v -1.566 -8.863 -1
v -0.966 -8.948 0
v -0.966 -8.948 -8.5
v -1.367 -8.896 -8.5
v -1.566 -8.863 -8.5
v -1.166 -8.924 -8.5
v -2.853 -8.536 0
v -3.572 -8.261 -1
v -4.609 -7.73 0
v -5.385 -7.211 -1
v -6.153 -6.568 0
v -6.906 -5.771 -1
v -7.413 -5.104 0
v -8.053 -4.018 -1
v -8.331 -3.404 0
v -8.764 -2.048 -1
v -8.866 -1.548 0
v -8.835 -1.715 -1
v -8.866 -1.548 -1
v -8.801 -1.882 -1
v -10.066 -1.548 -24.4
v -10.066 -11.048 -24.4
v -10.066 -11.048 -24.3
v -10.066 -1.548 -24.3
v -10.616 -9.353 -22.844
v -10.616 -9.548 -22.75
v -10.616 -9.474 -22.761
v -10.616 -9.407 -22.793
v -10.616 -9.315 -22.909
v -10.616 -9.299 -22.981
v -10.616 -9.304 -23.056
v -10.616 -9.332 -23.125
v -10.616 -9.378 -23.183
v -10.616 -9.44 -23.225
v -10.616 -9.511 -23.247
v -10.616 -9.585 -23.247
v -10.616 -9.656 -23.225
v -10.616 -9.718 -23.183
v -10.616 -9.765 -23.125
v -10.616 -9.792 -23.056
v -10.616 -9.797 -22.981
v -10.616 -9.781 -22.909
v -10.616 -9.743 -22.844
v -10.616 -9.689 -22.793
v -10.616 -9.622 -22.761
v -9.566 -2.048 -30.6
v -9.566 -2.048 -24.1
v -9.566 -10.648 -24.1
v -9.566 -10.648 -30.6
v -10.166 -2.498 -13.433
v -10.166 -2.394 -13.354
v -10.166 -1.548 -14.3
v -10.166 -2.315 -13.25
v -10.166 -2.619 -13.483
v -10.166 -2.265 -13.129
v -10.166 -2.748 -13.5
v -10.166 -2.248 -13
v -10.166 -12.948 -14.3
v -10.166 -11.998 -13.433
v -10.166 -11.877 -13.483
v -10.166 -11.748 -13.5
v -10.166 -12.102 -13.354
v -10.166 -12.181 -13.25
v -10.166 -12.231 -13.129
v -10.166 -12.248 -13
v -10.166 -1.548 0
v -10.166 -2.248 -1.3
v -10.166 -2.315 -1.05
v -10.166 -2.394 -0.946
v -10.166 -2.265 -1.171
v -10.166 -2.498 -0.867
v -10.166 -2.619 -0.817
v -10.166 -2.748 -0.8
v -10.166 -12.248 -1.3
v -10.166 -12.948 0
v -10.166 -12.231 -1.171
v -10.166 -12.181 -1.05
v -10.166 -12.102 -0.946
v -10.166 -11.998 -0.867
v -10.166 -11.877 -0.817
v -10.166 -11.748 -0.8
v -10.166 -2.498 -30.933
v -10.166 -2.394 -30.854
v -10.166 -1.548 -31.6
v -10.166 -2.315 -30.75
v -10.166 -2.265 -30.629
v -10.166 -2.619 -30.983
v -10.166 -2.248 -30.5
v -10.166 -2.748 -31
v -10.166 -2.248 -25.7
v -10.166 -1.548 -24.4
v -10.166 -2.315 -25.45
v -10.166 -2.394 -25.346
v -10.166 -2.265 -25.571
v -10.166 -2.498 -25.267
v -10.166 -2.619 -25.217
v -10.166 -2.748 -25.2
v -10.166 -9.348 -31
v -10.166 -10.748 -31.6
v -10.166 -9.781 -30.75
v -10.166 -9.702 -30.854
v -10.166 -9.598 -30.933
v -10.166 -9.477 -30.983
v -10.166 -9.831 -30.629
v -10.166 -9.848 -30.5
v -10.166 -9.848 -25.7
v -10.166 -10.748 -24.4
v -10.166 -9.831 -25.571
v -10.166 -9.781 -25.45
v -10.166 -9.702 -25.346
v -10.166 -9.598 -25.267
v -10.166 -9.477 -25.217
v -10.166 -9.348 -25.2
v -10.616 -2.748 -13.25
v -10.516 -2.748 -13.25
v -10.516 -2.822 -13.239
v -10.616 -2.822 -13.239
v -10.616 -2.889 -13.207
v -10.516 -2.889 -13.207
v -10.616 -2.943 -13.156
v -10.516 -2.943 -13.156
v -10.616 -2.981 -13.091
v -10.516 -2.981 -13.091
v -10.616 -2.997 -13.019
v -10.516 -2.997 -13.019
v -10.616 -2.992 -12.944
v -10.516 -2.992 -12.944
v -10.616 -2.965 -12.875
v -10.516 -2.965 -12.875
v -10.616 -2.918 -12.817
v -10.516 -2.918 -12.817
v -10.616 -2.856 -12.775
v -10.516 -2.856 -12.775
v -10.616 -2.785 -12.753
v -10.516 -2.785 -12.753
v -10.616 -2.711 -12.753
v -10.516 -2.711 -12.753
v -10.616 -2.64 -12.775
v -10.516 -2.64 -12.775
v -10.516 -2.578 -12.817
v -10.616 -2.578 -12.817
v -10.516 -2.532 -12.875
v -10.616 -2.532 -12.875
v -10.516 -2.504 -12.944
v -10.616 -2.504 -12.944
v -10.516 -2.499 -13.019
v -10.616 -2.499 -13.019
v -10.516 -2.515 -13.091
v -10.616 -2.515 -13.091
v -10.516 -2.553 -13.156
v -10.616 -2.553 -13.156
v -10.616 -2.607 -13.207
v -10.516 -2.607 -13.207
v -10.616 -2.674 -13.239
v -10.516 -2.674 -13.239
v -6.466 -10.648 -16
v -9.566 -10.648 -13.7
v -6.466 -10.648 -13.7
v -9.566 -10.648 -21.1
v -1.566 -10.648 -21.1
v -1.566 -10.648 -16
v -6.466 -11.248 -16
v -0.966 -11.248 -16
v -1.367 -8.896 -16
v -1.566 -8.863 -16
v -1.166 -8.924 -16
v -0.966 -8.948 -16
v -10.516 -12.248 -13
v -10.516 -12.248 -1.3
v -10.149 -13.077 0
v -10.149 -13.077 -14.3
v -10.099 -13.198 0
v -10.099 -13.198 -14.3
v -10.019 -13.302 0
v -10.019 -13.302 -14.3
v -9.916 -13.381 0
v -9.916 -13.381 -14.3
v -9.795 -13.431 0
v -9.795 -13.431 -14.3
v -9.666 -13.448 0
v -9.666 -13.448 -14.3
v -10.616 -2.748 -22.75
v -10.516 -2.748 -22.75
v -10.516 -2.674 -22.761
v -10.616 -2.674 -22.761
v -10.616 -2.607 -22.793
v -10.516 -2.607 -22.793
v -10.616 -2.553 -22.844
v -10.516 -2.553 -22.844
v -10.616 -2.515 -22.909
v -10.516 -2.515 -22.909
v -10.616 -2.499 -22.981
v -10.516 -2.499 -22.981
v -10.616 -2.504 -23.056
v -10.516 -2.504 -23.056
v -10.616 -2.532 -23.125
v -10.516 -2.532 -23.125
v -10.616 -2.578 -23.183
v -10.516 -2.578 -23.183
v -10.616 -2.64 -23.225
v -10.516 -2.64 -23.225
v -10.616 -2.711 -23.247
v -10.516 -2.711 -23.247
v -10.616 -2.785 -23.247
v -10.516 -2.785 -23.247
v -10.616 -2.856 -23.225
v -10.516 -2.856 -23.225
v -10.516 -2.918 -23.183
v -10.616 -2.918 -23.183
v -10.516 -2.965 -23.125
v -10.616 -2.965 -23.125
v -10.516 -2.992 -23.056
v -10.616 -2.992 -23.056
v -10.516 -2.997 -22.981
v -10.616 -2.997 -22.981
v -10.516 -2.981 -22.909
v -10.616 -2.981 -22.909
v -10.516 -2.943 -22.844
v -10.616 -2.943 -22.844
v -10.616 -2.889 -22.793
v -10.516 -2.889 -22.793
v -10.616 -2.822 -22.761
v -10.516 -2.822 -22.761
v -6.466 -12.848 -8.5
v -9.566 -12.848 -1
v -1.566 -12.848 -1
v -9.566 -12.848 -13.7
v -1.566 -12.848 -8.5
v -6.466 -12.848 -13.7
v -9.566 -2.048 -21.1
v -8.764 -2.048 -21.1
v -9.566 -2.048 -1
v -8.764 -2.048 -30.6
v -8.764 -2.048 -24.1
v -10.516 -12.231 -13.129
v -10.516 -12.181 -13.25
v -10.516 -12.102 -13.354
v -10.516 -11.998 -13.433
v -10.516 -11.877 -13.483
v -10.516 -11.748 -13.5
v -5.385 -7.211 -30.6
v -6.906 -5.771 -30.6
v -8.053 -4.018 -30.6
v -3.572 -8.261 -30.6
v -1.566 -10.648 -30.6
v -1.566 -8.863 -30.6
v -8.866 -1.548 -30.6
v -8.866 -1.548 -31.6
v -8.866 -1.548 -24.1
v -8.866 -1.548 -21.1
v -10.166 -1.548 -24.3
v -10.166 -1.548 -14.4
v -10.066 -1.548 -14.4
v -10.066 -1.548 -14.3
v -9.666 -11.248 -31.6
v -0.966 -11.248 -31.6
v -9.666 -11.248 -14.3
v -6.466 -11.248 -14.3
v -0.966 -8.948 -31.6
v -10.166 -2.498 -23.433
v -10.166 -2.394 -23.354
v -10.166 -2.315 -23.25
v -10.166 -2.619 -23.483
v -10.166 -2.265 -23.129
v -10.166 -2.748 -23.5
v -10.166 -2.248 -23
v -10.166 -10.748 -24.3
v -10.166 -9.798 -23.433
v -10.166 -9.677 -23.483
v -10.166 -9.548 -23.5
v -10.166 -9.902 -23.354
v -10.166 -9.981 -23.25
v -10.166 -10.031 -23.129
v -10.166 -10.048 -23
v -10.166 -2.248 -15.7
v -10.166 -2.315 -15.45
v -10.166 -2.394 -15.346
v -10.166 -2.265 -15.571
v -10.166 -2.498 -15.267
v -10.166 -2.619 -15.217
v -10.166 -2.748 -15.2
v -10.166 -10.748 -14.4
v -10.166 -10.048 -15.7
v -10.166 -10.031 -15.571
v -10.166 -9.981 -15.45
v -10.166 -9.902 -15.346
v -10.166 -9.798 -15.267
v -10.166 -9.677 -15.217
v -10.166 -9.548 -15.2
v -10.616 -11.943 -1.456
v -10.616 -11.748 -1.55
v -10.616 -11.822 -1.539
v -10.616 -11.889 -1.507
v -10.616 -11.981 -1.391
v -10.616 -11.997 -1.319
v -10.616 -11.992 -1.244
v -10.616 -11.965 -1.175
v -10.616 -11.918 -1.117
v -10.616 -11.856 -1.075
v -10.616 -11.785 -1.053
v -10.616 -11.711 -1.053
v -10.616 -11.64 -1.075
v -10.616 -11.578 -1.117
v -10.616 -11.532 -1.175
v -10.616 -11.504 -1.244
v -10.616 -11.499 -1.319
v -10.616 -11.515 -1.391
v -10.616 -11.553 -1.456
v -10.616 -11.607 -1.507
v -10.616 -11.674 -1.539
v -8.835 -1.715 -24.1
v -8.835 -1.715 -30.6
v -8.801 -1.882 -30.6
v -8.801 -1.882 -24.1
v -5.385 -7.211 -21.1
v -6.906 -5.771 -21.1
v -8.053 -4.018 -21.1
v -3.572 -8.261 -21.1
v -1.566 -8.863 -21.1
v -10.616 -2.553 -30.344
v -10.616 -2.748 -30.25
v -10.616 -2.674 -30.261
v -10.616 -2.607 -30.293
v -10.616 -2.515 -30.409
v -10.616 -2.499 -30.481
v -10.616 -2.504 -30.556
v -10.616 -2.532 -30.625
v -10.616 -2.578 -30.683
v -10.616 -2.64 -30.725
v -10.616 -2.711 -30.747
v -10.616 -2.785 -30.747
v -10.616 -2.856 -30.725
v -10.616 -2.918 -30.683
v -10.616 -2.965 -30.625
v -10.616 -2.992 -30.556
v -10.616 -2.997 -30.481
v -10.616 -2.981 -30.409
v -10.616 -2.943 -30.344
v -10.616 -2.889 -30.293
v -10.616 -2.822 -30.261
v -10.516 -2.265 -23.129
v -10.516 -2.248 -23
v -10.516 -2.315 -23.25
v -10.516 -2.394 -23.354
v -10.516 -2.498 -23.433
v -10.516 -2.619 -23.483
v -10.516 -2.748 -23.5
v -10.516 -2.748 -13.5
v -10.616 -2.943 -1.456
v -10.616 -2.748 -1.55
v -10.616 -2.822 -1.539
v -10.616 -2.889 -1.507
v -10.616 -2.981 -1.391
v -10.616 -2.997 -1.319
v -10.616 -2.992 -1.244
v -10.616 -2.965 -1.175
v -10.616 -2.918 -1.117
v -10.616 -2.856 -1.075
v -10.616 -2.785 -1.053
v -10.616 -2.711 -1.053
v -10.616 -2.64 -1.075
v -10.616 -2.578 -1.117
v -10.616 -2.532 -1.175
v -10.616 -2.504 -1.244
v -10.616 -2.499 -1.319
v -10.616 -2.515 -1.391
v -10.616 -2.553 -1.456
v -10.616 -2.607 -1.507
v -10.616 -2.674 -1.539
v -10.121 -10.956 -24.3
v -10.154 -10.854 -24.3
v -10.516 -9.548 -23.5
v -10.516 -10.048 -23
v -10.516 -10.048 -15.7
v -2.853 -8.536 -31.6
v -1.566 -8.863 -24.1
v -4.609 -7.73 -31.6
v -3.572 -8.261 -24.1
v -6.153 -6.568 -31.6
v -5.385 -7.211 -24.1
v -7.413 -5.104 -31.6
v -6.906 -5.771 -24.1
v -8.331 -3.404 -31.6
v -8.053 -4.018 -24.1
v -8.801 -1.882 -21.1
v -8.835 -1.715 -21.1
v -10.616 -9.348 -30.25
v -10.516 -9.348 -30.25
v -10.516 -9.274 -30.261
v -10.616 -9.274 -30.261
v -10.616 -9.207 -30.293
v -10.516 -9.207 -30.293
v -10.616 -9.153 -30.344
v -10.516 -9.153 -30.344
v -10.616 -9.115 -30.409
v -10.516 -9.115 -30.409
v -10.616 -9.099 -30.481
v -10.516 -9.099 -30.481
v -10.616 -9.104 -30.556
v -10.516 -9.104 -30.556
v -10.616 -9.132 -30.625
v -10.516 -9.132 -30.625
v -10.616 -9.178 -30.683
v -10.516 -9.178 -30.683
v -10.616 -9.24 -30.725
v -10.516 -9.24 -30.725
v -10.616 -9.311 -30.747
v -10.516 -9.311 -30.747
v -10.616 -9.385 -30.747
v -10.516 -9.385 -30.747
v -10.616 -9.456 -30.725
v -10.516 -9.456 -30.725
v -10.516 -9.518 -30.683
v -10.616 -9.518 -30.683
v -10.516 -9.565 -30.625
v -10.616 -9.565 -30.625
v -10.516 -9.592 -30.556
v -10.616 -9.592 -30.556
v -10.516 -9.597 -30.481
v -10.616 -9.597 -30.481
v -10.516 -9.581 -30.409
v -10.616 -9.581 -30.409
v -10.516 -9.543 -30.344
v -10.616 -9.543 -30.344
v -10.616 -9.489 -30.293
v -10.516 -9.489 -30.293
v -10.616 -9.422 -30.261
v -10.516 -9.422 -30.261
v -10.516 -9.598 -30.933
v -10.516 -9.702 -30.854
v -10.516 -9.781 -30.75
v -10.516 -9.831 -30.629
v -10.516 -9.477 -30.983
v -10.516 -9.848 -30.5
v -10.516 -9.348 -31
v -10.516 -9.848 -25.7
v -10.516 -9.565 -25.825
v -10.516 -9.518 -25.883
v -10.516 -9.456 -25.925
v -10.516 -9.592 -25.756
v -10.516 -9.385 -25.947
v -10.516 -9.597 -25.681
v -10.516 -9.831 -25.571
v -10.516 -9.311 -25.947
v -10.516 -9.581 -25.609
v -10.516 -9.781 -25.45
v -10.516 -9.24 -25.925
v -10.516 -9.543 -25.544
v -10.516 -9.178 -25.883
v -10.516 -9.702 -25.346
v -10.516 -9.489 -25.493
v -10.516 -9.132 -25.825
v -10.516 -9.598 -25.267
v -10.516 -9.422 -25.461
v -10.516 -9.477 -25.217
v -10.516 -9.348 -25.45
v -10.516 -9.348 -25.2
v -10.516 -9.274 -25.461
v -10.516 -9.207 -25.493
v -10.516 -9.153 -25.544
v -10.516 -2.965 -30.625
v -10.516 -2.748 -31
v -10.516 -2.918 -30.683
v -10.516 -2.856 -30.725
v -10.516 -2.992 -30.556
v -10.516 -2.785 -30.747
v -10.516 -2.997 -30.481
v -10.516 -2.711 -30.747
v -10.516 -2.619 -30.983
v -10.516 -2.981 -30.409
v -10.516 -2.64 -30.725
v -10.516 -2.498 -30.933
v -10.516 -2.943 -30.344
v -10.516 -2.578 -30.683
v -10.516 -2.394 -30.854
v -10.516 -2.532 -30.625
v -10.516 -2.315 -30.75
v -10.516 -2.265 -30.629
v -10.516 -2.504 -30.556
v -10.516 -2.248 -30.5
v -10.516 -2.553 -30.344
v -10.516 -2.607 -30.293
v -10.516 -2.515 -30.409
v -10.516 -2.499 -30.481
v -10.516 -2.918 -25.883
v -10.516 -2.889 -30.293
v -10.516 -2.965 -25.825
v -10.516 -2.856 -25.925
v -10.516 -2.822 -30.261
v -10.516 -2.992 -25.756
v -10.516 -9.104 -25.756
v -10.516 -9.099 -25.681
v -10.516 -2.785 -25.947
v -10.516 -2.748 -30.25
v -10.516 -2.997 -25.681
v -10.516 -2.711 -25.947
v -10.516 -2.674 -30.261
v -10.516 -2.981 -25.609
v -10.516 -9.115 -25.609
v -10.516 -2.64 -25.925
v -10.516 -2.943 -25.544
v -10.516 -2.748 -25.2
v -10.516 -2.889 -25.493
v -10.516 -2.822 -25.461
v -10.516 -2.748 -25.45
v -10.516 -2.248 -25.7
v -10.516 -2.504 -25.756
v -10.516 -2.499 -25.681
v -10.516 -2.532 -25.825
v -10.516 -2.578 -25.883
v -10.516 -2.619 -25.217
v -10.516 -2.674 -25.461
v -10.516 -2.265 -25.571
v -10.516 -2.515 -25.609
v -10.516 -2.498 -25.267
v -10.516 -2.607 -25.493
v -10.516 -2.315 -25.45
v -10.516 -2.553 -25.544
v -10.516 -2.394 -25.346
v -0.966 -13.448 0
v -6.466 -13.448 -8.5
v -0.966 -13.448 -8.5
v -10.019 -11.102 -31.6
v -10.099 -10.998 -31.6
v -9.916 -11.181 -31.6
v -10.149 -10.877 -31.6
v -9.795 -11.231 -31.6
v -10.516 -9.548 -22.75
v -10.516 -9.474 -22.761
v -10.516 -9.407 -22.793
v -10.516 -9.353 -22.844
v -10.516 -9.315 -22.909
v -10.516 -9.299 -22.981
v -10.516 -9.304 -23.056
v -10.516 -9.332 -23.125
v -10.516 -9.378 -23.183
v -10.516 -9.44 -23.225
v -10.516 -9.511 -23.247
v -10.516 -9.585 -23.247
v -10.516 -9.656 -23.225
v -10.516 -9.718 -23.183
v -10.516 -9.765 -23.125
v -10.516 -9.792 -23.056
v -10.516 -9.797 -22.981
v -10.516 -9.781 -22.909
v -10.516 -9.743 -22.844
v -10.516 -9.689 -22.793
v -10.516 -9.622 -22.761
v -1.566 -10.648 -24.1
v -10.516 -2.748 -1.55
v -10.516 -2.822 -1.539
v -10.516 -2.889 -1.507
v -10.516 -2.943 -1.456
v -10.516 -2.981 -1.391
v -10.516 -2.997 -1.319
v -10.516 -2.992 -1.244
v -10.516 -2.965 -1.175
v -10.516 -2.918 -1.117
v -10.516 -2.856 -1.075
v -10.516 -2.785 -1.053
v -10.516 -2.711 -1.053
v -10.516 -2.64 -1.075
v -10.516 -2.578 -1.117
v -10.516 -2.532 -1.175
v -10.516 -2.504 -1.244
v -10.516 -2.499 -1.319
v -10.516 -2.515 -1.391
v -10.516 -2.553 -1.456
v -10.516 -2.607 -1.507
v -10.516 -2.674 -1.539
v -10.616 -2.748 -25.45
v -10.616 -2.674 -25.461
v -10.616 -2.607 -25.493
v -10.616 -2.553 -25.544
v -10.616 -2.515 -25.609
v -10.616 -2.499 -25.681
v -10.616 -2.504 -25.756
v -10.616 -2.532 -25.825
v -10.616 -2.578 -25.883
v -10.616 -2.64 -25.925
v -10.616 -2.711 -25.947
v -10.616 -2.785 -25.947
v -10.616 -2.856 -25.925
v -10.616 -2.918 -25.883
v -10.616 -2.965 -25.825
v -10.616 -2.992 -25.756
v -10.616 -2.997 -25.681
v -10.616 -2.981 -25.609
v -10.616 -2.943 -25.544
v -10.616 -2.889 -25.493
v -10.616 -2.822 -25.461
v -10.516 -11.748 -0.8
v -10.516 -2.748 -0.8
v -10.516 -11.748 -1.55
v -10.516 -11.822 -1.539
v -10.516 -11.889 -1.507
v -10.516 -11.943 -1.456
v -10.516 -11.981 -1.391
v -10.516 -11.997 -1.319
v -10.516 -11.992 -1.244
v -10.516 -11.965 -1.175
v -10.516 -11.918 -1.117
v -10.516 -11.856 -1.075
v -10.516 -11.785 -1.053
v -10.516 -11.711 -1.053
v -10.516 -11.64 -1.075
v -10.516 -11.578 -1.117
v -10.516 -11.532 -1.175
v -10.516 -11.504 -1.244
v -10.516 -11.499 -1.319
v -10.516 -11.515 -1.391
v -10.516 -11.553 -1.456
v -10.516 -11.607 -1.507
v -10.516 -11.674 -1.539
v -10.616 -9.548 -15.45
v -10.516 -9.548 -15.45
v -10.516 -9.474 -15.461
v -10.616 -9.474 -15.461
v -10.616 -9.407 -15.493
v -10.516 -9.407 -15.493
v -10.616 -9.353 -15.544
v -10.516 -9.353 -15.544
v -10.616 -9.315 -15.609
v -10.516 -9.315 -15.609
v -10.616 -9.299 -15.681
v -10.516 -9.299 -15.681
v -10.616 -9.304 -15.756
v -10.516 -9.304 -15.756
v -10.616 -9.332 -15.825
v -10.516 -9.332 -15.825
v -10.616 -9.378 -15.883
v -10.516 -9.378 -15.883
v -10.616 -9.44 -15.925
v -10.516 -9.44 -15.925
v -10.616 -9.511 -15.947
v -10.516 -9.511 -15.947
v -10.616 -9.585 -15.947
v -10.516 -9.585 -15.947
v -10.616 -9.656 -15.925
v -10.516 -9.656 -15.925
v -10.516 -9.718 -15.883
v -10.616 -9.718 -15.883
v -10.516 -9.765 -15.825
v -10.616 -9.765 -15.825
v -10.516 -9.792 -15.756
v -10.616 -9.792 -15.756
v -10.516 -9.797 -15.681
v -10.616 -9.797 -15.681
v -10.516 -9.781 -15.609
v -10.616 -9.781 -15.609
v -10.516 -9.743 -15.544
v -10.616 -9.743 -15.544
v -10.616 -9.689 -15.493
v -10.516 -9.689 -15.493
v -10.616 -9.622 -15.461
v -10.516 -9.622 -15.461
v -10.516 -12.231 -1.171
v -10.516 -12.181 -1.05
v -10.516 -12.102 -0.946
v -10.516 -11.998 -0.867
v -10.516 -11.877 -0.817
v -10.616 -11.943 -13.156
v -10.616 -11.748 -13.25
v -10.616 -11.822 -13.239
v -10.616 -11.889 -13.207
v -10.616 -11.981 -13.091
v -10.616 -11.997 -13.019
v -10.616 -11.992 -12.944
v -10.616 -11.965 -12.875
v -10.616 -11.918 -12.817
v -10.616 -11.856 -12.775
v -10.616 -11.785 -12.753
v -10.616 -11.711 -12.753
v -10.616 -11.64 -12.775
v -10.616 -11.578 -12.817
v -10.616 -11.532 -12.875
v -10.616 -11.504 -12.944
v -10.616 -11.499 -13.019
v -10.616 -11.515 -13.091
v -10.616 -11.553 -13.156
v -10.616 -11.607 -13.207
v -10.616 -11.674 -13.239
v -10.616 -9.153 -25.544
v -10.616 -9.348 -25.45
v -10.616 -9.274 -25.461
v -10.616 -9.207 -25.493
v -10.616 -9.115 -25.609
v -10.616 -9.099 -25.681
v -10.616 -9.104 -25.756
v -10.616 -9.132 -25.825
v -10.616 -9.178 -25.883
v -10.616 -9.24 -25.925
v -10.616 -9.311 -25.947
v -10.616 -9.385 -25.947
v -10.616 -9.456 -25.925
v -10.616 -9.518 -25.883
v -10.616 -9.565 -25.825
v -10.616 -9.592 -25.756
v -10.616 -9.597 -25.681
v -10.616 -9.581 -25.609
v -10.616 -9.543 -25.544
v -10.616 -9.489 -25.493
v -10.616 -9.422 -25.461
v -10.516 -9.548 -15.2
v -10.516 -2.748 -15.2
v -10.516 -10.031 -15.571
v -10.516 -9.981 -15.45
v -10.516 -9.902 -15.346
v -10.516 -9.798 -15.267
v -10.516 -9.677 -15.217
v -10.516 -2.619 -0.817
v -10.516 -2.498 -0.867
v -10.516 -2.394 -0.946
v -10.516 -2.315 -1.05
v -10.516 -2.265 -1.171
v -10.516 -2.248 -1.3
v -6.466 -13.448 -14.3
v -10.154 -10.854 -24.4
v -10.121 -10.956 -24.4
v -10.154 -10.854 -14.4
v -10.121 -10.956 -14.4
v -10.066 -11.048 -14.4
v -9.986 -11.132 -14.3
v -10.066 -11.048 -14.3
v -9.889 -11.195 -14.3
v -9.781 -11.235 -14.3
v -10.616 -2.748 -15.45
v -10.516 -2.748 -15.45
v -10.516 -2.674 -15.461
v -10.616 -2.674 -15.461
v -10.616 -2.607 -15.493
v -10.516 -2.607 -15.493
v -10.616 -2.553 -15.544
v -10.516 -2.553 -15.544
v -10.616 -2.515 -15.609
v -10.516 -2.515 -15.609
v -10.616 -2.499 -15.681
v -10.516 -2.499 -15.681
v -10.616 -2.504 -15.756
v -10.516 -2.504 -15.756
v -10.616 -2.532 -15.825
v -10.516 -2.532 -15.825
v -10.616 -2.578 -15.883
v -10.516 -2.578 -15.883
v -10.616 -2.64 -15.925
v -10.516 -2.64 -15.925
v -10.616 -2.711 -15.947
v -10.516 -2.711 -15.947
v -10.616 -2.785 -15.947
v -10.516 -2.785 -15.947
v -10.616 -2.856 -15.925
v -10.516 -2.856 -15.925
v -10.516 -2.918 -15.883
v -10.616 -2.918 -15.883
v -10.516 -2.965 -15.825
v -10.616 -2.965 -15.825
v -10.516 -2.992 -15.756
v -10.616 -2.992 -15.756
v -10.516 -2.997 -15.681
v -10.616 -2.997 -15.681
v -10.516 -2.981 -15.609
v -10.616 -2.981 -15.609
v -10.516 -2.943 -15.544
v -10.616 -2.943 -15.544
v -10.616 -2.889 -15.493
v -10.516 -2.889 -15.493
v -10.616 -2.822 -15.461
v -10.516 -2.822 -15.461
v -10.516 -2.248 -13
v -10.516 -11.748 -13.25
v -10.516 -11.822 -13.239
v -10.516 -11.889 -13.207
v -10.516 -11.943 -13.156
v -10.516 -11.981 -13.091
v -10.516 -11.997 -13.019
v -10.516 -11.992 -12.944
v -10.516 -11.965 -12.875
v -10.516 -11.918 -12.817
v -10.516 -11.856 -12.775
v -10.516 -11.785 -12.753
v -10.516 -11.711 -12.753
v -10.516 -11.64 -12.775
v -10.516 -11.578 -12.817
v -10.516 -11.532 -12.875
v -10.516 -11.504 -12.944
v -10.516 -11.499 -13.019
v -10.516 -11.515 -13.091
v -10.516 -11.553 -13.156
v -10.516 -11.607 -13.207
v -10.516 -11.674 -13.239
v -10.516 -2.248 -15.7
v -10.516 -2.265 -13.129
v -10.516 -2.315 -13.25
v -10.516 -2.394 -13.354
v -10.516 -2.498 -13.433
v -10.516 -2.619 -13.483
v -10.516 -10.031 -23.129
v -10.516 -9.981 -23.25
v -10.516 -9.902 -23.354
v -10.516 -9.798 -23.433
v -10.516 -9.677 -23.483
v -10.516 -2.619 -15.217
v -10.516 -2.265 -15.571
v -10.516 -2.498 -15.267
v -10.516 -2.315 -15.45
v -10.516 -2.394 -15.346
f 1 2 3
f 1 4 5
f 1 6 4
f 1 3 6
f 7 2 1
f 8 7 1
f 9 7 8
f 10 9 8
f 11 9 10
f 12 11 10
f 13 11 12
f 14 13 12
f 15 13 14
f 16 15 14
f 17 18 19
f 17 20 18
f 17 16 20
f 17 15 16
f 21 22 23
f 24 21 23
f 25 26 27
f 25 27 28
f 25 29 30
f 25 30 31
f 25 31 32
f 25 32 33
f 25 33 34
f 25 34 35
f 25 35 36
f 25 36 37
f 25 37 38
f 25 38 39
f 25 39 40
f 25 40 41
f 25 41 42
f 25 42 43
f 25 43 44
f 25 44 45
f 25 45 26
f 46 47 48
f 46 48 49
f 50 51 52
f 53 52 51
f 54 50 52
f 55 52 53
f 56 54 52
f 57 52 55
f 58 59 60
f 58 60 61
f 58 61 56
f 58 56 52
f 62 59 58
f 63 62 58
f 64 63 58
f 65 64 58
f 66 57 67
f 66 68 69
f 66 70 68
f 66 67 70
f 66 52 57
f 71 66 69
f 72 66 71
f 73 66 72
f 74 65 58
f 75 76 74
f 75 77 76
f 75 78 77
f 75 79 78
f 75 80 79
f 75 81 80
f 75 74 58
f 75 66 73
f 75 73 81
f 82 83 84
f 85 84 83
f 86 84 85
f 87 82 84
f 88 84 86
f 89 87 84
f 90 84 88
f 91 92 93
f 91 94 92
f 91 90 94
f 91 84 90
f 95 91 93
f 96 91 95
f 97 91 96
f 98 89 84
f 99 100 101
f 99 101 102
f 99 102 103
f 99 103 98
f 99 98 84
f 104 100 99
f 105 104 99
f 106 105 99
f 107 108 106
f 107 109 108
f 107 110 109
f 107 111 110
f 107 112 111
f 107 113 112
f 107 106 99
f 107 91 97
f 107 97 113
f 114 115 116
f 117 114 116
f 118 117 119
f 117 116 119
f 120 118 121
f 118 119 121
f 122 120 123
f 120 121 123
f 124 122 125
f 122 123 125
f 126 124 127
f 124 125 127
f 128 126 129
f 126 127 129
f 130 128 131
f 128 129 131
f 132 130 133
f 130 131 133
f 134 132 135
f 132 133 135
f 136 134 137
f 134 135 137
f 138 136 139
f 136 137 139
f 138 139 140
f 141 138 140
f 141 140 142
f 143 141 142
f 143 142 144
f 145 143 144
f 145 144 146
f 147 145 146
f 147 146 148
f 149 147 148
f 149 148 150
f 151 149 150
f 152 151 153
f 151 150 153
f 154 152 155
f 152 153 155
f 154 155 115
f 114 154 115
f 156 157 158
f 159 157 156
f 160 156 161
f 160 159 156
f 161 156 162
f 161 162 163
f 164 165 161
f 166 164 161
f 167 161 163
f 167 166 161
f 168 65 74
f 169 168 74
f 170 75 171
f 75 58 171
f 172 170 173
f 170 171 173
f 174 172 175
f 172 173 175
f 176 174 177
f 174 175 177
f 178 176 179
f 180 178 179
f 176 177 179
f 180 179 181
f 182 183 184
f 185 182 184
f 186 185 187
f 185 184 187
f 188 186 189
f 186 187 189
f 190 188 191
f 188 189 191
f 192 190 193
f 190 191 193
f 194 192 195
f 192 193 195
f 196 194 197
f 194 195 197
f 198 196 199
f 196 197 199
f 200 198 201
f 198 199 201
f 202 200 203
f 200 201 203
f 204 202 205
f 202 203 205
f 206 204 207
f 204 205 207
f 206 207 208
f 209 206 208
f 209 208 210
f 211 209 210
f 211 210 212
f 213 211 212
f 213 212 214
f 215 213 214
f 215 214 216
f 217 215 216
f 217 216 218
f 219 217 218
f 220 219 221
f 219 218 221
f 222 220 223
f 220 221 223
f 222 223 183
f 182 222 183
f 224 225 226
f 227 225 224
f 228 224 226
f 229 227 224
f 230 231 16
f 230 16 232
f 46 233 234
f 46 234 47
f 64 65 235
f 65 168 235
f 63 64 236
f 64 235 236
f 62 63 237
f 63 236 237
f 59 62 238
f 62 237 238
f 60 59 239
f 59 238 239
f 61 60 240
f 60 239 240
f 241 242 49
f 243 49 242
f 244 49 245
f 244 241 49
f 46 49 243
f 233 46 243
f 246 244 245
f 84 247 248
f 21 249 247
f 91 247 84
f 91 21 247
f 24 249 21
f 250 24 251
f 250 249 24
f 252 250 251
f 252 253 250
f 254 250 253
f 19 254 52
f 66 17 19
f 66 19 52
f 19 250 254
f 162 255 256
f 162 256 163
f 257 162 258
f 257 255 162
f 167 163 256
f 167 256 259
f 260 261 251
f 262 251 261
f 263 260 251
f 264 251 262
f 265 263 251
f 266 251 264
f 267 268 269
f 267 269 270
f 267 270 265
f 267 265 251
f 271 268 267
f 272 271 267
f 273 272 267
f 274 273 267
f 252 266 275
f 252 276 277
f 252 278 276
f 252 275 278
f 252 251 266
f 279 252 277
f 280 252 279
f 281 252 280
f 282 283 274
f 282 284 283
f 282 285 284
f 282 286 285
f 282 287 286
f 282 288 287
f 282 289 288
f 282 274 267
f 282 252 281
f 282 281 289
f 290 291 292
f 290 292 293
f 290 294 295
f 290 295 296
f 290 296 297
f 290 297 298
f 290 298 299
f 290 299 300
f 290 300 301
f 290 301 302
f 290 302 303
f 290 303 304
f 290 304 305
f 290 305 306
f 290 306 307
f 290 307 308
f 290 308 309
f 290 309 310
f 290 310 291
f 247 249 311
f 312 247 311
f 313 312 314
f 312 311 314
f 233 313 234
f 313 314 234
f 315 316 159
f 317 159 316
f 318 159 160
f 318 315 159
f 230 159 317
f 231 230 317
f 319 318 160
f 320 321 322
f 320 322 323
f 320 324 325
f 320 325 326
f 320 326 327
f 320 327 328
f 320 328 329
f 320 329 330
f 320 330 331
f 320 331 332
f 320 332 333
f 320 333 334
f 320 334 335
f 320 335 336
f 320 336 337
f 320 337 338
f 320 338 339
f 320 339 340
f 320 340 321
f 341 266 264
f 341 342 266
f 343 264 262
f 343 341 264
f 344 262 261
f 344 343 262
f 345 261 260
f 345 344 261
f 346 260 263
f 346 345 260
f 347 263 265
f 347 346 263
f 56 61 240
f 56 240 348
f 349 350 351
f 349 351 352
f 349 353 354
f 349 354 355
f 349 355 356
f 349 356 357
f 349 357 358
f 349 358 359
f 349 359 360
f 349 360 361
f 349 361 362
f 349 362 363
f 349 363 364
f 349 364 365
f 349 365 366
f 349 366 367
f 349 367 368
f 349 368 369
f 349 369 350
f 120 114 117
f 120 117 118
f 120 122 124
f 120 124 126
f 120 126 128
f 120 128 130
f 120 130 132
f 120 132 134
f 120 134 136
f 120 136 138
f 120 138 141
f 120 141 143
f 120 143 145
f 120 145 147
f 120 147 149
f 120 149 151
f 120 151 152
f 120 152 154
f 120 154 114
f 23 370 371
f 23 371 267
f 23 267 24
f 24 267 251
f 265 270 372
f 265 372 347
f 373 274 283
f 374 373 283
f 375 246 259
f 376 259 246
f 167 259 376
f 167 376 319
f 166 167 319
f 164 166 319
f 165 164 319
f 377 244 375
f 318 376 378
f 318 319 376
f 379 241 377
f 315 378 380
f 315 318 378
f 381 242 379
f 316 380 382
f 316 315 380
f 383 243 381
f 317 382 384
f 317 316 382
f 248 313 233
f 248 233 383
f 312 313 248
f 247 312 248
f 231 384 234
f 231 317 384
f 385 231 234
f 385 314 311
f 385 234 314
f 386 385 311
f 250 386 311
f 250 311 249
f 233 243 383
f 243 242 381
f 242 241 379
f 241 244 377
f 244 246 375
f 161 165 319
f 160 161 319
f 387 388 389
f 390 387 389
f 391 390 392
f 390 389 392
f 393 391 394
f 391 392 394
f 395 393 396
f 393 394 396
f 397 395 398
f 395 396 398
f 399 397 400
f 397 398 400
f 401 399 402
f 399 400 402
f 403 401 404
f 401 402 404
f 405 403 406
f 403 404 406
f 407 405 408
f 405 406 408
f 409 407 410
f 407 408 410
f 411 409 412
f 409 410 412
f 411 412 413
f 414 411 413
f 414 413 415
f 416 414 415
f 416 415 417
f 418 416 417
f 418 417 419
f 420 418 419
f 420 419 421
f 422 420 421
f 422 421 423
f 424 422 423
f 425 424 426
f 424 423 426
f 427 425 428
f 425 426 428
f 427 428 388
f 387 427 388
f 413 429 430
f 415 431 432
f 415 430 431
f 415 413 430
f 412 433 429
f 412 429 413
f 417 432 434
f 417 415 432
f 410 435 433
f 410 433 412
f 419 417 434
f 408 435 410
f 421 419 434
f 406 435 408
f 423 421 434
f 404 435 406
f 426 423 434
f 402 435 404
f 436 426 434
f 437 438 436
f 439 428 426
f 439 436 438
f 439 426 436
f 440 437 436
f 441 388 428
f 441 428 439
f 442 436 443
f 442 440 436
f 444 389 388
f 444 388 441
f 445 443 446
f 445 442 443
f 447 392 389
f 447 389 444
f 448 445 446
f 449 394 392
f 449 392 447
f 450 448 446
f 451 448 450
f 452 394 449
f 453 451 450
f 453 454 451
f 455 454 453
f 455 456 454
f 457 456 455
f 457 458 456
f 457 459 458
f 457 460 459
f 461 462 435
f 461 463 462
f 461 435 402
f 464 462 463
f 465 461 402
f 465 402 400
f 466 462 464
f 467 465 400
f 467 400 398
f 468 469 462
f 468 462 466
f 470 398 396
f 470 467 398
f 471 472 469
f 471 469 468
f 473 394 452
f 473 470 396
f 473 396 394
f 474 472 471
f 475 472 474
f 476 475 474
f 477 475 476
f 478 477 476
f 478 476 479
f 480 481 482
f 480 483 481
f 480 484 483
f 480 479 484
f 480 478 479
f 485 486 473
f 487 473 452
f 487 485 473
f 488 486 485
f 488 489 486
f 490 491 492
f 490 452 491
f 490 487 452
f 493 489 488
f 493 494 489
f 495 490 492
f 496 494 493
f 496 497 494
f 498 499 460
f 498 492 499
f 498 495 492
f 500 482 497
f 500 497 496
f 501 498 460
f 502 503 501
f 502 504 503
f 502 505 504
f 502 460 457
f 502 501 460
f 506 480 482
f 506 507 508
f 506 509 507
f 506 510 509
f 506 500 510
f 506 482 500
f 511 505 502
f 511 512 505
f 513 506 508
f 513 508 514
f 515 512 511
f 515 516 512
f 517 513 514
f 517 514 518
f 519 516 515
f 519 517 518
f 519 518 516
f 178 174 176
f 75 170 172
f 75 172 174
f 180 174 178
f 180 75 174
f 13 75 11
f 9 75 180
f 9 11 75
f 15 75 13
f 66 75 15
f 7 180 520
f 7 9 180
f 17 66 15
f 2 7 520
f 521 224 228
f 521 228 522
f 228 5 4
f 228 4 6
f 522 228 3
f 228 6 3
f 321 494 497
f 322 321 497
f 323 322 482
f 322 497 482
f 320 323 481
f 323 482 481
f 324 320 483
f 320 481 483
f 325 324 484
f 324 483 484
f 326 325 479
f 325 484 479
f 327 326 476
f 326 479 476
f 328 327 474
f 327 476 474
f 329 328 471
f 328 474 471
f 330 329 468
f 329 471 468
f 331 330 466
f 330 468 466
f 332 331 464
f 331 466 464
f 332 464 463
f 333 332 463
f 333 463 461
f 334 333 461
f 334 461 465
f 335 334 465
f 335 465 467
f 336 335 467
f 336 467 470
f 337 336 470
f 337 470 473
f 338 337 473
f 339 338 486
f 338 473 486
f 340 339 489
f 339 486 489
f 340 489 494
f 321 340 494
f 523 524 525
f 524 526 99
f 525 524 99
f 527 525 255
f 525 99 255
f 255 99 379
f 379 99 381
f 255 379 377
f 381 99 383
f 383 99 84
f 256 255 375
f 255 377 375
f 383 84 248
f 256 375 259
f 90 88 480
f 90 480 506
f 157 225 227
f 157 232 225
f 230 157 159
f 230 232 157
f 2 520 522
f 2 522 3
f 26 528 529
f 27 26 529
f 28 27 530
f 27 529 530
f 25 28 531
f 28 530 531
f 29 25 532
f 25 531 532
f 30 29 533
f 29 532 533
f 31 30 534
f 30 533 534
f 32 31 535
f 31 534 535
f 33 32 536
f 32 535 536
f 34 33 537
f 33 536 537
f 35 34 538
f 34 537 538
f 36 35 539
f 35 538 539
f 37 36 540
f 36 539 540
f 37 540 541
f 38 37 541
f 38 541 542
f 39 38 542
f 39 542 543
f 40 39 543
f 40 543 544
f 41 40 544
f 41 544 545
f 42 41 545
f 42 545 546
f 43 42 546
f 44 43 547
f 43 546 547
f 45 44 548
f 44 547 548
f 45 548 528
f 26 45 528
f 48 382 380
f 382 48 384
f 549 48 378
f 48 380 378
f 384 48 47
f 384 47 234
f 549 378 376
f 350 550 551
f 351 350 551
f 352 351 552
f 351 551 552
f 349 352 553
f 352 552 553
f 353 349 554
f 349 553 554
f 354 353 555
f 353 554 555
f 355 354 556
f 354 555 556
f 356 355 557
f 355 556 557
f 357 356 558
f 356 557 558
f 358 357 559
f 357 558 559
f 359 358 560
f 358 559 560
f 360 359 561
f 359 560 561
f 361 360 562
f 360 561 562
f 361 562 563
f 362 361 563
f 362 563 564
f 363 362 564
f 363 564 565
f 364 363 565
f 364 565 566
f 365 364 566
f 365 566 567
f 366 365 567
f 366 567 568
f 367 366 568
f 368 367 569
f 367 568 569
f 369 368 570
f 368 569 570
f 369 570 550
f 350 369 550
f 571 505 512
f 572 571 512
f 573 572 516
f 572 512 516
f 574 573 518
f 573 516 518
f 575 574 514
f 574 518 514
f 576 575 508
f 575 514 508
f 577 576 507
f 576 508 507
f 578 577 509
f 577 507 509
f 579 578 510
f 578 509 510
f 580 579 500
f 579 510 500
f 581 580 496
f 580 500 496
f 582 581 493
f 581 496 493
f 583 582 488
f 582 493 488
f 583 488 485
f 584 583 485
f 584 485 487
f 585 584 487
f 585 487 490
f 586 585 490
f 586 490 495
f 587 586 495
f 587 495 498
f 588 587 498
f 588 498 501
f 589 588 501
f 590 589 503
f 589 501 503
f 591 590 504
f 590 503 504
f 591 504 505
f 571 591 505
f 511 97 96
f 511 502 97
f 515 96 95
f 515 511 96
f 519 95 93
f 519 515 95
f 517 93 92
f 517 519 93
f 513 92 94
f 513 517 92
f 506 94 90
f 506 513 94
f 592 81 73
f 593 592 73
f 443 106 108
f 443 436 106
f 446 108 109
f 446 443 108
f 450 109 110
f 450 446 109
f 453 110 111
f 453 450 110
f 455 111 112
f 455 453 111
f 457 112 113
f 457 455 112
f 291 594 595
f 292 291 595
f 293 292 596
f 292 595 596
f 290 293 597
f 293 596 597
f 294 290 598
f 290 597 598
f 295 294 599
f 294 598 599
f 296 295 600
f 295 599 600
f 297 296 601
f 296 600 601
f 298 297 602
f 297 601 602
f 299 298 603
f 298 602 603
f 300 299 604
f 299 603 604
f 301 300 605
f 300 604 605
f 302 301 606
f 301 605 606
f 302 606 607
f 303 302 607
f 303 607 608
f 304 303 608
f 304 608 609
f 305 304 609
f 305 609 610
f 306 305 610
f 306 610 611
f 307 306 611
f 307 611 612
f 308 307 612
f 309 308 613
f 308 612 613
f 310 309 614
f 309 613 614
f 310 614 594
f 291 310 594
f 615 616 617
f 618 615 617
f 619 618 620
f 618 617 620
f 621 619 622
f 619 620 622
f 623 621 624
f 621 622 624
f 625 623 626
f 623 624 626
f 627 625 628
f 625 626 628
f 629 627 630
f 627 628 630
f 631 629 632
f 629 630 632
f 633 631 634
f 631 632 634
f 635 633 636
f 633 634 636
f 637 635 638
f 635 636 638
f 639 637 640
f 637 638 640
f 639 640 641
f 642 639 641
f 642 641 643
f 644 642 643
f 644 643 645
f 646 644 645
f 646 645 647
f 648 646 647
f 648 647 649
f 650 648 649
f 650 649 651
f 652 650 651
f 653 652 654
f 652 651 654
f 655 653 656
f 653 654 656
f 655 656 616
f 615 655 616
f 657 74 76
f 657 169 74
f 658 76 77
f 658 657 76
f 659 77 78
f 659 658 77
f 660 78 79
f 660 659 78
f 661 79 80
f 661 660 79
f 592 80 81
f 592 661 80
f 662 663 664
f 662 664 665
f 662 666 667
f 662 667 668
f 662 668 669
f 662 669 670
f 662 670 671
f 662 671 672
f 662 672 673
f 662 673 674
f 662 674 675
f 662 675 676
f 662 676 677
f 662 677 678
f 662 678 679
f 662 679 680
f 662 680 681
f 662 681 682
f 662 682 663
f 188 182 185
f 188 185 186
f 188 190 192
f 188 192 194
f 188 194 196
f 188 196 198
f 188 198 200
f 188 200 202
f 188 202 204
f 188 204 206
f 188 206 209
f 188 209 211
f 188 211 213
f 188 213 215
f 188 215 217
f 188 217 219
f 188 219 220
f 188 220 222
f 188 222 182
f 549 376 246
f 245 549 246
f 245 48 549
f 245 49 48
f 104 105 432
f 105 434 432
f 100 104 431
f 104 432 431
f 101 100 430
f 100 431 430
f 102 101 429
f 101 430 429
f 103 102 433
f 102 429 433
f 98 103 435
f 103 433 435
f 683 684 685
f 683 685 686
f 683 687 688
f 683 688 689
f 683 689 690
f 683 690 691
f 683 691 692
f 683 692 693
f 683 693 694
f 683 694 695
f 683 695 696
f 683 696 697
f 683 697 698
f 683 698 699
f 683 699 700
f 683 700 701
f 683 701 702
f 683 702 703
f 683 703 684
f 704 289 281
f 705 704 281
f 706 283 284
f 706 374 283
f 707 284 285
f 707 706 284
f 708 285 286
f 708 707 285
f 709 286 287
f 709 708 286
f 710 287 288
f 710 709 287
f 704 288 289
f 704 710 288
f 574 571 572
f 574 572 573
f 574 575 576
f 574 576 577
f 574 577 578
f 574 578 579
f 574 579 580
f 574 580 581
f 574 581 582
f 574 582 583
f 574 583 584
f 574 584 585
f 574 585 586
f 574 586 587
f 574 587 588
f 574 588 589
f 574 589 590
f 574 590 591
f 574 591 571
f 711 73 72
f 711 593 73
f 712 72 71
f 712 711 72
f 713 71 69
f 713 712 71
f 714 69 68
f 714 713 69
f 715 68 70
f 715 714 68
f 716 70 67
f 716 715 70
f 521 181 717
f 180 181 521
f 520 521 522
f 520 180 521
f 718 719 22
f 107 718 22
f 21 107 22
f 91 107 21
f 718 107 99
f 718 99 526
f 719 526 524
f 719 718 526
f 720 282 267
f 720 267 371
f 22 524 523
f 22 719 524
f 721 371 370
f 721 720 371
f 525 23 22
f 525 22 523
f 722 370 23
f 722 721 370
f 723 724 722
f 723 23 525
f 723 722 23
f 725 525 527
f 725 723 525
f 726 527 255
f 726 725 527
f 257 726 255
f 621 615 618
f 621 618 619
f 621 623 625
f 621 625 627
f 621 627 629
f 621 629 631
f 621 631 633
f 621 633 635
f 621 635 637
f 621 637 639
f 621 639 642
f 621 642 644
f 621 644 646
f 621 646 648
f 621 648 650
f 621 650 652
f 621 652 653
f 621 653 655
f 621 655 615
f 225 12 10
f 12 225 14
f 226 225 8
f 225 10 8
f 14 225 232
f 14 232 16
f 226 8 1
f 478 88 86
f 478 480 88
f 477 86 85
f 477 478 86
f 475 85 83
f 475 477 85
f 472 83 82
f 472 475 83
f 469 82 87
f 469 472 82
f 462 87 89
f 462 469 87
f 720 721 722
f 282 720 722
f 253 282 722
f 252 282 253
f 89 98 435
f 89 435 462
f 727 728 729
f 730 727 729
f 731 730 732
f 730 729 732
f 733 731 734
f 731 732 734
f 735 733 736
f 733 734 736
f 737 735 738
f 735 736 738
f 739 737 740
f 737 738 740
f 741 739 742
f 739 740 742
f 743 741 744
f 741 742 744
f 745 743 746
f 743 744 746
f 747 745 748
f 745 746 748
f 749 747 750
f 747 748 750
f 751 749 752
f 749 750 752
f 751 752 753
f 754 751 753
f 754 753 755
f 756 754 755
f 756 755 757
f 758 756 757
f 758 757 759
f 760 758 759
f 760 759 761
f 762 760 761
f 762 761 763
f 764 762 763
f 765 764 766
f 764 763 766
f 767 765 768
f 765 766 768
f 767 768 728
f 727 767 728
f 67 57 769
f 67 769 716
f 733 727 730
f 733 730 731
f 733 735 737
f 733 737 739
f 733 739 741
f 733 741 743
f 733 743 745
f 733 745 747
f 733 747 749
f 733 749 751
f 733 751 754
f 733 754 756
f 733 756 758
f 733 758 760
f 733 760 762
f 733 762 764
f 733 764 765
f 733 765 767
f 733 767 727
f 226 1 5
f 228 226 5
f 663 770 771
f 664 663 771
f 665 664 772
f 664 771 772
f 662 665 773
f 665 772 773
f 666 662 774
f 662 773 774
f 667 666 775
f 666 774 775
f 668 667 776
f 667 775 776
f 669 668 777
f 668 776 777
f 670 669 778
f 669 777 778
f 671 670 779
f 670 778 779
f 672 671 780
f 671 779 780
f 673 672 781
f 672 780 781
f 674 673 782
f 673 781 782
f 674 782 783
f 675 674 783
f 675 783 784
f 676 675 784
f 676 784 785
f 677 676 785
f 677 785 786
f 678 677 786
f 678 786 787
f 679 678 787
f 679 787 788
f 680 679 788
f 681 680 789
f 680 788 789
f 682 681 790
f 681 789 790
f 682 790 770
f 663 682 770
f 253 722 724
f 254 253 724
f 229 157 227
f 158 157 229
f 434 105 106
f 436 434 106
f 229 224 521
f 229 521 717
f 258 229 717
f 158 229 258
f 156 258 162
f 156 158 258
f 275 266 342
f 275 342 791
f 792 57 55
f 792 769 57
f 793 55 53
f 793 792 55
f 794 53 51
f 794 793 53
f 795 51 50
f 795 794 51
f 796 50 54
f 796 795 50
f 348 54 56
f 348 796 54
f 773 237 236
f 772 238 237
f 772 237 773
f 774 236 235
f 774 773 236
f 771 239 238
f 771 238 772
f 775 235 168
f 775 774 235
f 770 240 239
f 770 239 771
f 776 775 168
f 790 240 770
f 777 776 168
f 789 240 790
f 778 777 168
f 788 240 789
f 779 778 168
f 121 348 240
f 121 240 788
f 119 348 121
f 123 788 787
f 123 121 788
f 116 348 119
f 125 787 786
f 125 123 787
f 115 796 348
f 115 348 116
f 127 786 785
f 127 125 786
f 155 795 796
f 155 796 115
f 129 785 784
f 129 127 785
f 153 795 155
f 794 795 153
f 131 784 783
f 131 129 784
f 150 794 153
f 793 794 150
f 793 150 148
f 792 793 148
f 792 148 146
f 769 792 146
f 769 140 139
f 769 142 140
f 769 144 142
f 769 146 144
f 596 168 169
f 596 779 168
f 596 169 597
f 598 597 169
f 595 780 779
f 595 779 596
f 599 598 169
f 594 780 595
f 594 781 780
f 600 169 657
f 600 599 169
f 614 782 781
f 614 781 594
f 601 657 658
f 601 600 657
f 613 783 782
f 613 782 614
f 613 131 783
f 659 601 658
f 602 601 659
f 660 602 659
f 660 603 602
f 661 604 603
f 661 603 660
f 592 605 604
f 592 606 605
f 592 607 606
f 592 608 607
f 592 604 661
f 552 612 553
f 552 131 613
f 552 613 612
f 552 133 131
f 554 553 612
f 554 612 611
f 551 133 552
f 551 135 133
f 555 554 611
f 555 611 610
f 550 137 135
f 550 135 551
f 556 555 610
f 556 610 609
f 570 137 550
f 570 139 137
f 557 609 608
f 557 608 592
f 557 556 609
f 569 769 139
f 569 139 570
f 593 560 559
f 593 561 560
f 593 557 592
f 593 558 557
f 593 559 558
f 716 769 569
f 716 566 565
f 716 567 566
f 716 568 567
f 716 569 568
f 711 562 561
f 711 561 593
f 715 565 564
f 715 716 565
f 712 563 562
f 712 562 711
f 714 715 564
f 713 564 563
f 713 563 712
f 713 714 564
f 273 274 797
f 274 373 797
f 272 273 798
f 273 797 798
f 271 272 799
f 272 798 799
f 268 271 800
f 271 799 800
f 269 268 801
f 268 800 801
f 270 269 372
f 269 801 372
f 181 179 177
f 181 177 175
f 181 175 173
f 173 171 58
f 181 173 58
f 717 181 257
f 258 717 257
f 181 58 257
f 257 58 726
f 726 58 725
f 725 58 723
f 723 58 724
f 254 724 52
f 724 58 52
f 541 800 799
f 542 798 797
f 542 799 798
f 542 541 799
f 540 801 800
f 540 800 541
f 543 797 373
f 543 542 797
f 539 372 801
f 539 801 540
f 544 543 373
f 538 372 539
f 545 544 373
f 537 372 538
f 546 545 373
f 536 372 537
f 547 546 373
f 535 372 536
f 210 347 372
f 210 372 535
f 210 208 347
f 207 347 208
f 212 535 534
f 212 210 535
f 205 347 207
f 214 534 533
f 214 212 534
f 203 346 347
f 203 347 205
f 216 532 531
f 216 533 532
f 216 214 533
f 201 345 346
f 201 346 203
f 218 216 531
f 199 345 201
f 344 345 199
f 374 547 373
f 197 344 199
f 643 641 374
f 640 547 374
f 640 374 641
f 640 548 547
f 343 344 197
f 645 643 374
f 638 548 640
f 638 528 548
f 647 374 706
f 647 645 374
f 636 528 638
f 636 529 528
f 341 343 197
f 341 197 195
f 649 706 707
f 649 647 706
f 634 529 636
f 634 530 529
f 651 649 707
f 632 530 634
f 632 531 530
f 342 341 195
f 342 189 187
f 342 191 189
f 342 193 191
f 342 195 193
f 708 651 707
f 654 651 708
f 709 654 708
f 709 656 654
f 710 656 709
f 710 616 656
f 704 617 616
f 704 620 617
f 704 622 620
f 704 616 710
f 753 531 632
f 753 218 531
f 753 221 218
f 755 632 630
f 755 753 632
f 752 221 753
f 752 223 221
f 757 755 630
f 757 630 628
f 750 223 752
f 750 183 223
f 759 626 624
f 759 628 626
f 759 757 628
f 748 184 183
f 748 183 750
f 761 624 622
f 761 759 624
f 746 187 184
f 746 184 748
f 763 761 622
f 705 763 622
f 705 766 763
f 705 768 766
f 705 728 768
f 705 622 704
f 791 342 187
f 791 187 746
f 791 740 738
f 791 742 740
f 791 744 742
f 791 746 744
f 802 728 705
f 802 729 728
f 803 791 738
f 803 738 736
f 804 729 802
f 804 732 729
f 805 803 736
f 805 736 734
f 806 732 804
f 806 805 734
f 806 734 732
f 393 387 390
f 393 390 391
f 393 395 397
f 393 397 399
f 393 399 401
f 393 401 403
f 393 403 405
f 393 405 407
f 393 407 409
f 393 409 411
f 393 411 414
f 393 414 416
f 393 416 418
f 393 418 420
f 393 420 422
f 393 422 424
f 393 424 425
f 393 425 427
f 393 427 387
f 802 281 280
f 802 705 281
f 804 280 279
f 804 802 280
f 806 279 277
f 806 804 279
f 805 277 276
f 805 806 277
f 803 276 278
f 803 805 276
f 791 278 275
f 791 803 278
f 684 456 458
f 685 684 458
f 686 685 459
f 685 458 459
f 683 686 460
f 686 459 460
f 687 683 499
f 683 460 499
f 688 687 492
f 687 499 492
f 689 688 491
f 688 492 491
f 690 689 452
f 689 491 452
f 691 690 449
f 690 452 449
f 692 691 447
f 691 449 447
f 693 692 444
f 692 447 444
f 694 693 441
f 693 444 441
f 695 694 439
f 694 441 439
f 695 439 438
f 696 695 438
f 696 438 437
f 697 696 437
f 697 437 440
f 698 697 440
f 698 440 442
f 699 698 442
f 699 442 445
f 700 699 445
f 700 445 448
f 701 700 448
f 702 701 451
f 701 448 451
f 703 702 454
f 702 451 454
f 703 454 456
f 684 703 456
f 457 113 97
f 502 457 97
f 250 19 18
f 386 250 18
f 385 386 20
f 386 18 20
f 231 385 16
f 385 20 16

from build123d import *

# Parameters (mm, degrees)
BOSS_EXTRUDE1_DEPTH = 31.6
SKETCH4_W           = 12.7
SKETCH4_H           = 10
SKETCH4_W_2         = 8.3
SKETCH4_H_2         = 7.8
SKETCH4_W_3         = 5.8
SKETCH4_H_3         = 7.6
BOSS_EXTRUDE2_DEPTH = 0.35
FILLET1_R           = 0.5
SKETCH5_R           = 0.25
BOSS_EXTRUDE3_DEPTH = 0.1
SKETCH19_W          = 17.3
SKETCH19_H          = 2.2
CUT_EXTRUDE11_DEPTH = 36.553470936
FILLET2_R           = 0.5
SKETCH21_W          = 0.1
SKETCH21_H          = 9.7
CUT_EXTRUDE13_DEPTH = 0.1
SKETCH20_W          = 5.5
SKETCH20_H          = 7.5
CUT_EXTRUDE12_DEPTH = 36.945875479
SKETCH22_W          = 7.3
SKETCH22_H          = 12.7
CUT_EXTRUDE14_DEPTH = 11.3
SKETCH22_3_W        = 7.3
SKETCH22_3_H        = 7.4
SKETCH22_3_H_2      = 6.5
CUT_EXTRUDE15_DEPTH = 9.1
SKETCH23_W          = 6.5
SKETCH23_H          = 8.6
CUT_EXTRUDE16_DEPTH = 0.7
BOSS_EXTRUDE4_REACH = 37.07


with BuildPart() as part:
    # Sketch2 → Boss-Extrude1 (new body)
    with BuildSketch(Plane.XY):
        with BuildLine():
            Line((-0.965868705, -13.448021996), (-0.965868705, -8.948021996))
            ThreePointArc((-0.965868705, -8.948021996), (-6.152703888, -6.568427123), (-8.865868705, -1.548021996))
            Line((-8.865868705, -1.548021996), (-10.165868705, -1.548021996))
            Line((-10.165868705, -1.548021996), (-10.165868705, -13.448021996))
            Line((-10.165868705, -13.448021996), (-0.965868705, -13.448021996))
        make_face()
    extrude(amount=-BOSS_EXTRUDE1_DEPTH)

    # Sketch4 → Boss-Extrude2 (add)
    with BuildSketch(Plane.ZY.offset(10.165868705)):
        with Locations((-7.15, -7.248021996)):
            Rectangle(SKETCH4_W, SKETCH4_H)
        with Locations((-19.35, -6.148021996)):
            Rectangle(SKETCH4_W_2, SKETCH4_H_2)
        with Locations((-28.1, -6.048021996)):
            Rectangle(SKETCH4_W_3, SKETCH4_H_3)
    extrude(amount=BOSS_EXTRUDE2_DEPTH)

    # Fillet1
    fillet1_edges = [part.edges().sort_by_distance(p)[0] for p in [
        (-10.340868705, -2.248021996, -13.5),
        (-10.340868705, -12.248021996, -13.5),
        (-10.340868705, -12.248021996, -0.8),
        (-10.340868705, -2.248021996, -0.8),
        (-10.340868705, -2.248021996, -31),
        (-10.340868705, -9.848021996, -31),
        (-10.340868705, -9.848021996, -25.2),
        (-10.340868705, -2.248021996, -25.2),
        (-10.340868705, -2.248021996, -23.5),
        (-10.340868705, -10.048021996, -23.5),
        (-10.340868705, -10.048021996, -15.2),
        (-10.340868705, -2.248021996, -15.2),
    ]]
    fillet(fillet1_edges, radius=FILLET1_R)

    # Sketch5 → Boss-Extrude3 (add)
    with BuildSketch(Plane.ZY.offset(10.515868705)):
        with Locations(Location((-13, -2.748021996, 0), (0, 0, 180))):
            Circle(SKETCH5_R)
        with Locations(Location((-1.3, -2.748021996, 0), (0, 0, 180))):
            Circle(SKETCH5_R)
        with Locations((-23, -2.748021996)):
            Circle(SKETCH5_R)
        with Locations((-23, -9.548021996)):
            Circle(SKETCH5_R)
        with Locations(Location((-1.3, -11.748021996, 0), (0, 0, 180))):
            Circle(SKETCH5_R)
        with Locations(Location((-13, -11.748021996, 0), (0, 0, 180))):
            Circle(SKETCH5_R)
        with Locations((-15.7, -2.748021996)):
            Circle(SKETCH5_R)
        with Locations((-15.7, -9.548021996)):
            Circle(SKETCH5_R)
        with Locations((-30.5, -2.748021996)):
            Circle(SKETCH5_R)
        with Locations((-25.7, -2.748021996)):
            Circle(SKETCH5_R)
        with Locations((-25.7, -9.348021996)):
            Circle(SKETCH5_R)
        with Locations((-30.5, -9.348021996)):
            Circle(SKETCH5_R)
    extrude(amount=BOSS_EXTRUDE3_DEPTH)

    # Sketch19 → Cut-Extrude11 (cut, through all)
    with BuildSketch(Plane.ZY.offset(10.165868705)):
        with Locations((-22.95, -12.348021996)):
            Rectangle(SKETCH19_W, SKETCH19_H)
    extrude(amount=-CUT_EXTRUDE11_DEPTH, mode=Mode.SUBTRACT)

    # Fillet2
    fillet2_edges = [part.edges().sort_by_distance(p)[0] for p in [
        (-10.165868705, -13.448021996, -7.15),
        (-10.165868705, -11.248021996, -22.95),
    ]]
    fillet(fillet2_edges, radius=FILLET2_R)

    # Sketch21 → Cut-Extrude13 (cut)
    with BuildSketch(Plane.ZY.offset(10.165868705)):
        with Locations((-14.35, -6.398021996)):
            Rectangle(SKETCH21_W, SKETCH21_H)
        with Locations((-24.35, -6.398021996)):
            Rectangle(SKETCH21_W, SKETCH21_H)
    extrude(amount=-CUT_EXTRUDE13_DEPTH, mode=Mode.SUBTRACT)

    # Sketch20 → Cut-Extrude12 (cut, through all)
    with BuildSketch(Plane(origin=(0, 0, 0), x_dir=(1, 0, 0), z_dir=(0, 1, 0))):
        with Locations((-3.715868705, 12.25)):
            Rectangle(SKETCH20_W, SKETCH20_H)
    extrude(amount=-CUT_EXTRUDE12_DEPTH, mode=Mode.SUBTRACT)

    # Sketch22 → Cut-Extrude14 (cut)
    with BuildSketch(Plane(origin=(0, -1.548021996, 0), x_dir=(1, 0, 0), z_dir=(0, 1, 0))):
        with Locations((-5.215868705, 7.35)):
            Rectangle(SKETCH22_W, SKETCH22_H)
    extrude(amount=-CUT_EXTRUDE14_DEPTH, mode=Mode.SUBTRACT)

    # Sketch22<3> → Cut-Extrude15 (cut)
    with BuildSketch(Plane(origin=(0, -1.548021996, 0), x_dir=(1, 0, 0), z_dir=(0, 1, 0))):
        with Locations((-5.215868705, 17.4)):
            Rectangle(SKETCH22_3_W, SKETCH22_3_H)
        with Locations((-5.215868705, 27.35)):
            Rectangle(SKETCH22_3_W, SKETCH22_3_H_2)
    extrude(amount=-CUT_EXTRUDE15_DEPTH, mode=Mode.SUBTRACT)

    # Sketch23 → Cut-Extrude16 (cut)
    with BuildSketch(Plane(origin=(-8.865868705, 0, 0), x_dir=(0, 0, -1), z_dir=(1, 0, 0))):
        Polygon((1, -12.848021996), (13.7, -12.848021996), (13.7, -10.648021996), (21.1, -10.648021996), (21.1, -2.048021996), (1, -2.048021996), align=None)
        with Locations((27.35, -6.348021996)):
            Rectangle(SKETCH23_W, SKETCH23_H)
    extrude(amount=-CUT_EXTRUDE16_DEPTH, mode=Mode.SUBTRACT)

    # Sketch24 → Boss-Extrude4 (add, up to next)
    with BuildSketch(Plane(origin=(0, 0, -1), x_dir=(-1, 0, 0), z_dir=(0, 0, -1)), mode=Mode.PRIVATE) as boss_extrude4_sk1:
        with BuildLine():
            Line((8.865868705, -2.048021996), (8.865868705, -1.548021996))
            ThreePointArc((8.865868705, -1.548021996), (8.818419162, -1.798744975), (8.763880756, -2.048021996))
            Line((8.763880756, -2.048021996), (8.865868705, -2.048021996))
        make_face()
    boss_extrude4_tool1 = extrude(boss_extrude4_sk1.sketch, amount=BOSS_EXTRUDE4_REACH, mode=Mode.PRIVATE) - part.part
    add(boss_extrude4_tool1.solids().sort_by_distance((-8.832663, -1.885567, -1))[0])
    add(boss_extrude4_tool1.solids().sort_by_distance((-8.832663, -1.885567, -1))[1])


solid = part.part
